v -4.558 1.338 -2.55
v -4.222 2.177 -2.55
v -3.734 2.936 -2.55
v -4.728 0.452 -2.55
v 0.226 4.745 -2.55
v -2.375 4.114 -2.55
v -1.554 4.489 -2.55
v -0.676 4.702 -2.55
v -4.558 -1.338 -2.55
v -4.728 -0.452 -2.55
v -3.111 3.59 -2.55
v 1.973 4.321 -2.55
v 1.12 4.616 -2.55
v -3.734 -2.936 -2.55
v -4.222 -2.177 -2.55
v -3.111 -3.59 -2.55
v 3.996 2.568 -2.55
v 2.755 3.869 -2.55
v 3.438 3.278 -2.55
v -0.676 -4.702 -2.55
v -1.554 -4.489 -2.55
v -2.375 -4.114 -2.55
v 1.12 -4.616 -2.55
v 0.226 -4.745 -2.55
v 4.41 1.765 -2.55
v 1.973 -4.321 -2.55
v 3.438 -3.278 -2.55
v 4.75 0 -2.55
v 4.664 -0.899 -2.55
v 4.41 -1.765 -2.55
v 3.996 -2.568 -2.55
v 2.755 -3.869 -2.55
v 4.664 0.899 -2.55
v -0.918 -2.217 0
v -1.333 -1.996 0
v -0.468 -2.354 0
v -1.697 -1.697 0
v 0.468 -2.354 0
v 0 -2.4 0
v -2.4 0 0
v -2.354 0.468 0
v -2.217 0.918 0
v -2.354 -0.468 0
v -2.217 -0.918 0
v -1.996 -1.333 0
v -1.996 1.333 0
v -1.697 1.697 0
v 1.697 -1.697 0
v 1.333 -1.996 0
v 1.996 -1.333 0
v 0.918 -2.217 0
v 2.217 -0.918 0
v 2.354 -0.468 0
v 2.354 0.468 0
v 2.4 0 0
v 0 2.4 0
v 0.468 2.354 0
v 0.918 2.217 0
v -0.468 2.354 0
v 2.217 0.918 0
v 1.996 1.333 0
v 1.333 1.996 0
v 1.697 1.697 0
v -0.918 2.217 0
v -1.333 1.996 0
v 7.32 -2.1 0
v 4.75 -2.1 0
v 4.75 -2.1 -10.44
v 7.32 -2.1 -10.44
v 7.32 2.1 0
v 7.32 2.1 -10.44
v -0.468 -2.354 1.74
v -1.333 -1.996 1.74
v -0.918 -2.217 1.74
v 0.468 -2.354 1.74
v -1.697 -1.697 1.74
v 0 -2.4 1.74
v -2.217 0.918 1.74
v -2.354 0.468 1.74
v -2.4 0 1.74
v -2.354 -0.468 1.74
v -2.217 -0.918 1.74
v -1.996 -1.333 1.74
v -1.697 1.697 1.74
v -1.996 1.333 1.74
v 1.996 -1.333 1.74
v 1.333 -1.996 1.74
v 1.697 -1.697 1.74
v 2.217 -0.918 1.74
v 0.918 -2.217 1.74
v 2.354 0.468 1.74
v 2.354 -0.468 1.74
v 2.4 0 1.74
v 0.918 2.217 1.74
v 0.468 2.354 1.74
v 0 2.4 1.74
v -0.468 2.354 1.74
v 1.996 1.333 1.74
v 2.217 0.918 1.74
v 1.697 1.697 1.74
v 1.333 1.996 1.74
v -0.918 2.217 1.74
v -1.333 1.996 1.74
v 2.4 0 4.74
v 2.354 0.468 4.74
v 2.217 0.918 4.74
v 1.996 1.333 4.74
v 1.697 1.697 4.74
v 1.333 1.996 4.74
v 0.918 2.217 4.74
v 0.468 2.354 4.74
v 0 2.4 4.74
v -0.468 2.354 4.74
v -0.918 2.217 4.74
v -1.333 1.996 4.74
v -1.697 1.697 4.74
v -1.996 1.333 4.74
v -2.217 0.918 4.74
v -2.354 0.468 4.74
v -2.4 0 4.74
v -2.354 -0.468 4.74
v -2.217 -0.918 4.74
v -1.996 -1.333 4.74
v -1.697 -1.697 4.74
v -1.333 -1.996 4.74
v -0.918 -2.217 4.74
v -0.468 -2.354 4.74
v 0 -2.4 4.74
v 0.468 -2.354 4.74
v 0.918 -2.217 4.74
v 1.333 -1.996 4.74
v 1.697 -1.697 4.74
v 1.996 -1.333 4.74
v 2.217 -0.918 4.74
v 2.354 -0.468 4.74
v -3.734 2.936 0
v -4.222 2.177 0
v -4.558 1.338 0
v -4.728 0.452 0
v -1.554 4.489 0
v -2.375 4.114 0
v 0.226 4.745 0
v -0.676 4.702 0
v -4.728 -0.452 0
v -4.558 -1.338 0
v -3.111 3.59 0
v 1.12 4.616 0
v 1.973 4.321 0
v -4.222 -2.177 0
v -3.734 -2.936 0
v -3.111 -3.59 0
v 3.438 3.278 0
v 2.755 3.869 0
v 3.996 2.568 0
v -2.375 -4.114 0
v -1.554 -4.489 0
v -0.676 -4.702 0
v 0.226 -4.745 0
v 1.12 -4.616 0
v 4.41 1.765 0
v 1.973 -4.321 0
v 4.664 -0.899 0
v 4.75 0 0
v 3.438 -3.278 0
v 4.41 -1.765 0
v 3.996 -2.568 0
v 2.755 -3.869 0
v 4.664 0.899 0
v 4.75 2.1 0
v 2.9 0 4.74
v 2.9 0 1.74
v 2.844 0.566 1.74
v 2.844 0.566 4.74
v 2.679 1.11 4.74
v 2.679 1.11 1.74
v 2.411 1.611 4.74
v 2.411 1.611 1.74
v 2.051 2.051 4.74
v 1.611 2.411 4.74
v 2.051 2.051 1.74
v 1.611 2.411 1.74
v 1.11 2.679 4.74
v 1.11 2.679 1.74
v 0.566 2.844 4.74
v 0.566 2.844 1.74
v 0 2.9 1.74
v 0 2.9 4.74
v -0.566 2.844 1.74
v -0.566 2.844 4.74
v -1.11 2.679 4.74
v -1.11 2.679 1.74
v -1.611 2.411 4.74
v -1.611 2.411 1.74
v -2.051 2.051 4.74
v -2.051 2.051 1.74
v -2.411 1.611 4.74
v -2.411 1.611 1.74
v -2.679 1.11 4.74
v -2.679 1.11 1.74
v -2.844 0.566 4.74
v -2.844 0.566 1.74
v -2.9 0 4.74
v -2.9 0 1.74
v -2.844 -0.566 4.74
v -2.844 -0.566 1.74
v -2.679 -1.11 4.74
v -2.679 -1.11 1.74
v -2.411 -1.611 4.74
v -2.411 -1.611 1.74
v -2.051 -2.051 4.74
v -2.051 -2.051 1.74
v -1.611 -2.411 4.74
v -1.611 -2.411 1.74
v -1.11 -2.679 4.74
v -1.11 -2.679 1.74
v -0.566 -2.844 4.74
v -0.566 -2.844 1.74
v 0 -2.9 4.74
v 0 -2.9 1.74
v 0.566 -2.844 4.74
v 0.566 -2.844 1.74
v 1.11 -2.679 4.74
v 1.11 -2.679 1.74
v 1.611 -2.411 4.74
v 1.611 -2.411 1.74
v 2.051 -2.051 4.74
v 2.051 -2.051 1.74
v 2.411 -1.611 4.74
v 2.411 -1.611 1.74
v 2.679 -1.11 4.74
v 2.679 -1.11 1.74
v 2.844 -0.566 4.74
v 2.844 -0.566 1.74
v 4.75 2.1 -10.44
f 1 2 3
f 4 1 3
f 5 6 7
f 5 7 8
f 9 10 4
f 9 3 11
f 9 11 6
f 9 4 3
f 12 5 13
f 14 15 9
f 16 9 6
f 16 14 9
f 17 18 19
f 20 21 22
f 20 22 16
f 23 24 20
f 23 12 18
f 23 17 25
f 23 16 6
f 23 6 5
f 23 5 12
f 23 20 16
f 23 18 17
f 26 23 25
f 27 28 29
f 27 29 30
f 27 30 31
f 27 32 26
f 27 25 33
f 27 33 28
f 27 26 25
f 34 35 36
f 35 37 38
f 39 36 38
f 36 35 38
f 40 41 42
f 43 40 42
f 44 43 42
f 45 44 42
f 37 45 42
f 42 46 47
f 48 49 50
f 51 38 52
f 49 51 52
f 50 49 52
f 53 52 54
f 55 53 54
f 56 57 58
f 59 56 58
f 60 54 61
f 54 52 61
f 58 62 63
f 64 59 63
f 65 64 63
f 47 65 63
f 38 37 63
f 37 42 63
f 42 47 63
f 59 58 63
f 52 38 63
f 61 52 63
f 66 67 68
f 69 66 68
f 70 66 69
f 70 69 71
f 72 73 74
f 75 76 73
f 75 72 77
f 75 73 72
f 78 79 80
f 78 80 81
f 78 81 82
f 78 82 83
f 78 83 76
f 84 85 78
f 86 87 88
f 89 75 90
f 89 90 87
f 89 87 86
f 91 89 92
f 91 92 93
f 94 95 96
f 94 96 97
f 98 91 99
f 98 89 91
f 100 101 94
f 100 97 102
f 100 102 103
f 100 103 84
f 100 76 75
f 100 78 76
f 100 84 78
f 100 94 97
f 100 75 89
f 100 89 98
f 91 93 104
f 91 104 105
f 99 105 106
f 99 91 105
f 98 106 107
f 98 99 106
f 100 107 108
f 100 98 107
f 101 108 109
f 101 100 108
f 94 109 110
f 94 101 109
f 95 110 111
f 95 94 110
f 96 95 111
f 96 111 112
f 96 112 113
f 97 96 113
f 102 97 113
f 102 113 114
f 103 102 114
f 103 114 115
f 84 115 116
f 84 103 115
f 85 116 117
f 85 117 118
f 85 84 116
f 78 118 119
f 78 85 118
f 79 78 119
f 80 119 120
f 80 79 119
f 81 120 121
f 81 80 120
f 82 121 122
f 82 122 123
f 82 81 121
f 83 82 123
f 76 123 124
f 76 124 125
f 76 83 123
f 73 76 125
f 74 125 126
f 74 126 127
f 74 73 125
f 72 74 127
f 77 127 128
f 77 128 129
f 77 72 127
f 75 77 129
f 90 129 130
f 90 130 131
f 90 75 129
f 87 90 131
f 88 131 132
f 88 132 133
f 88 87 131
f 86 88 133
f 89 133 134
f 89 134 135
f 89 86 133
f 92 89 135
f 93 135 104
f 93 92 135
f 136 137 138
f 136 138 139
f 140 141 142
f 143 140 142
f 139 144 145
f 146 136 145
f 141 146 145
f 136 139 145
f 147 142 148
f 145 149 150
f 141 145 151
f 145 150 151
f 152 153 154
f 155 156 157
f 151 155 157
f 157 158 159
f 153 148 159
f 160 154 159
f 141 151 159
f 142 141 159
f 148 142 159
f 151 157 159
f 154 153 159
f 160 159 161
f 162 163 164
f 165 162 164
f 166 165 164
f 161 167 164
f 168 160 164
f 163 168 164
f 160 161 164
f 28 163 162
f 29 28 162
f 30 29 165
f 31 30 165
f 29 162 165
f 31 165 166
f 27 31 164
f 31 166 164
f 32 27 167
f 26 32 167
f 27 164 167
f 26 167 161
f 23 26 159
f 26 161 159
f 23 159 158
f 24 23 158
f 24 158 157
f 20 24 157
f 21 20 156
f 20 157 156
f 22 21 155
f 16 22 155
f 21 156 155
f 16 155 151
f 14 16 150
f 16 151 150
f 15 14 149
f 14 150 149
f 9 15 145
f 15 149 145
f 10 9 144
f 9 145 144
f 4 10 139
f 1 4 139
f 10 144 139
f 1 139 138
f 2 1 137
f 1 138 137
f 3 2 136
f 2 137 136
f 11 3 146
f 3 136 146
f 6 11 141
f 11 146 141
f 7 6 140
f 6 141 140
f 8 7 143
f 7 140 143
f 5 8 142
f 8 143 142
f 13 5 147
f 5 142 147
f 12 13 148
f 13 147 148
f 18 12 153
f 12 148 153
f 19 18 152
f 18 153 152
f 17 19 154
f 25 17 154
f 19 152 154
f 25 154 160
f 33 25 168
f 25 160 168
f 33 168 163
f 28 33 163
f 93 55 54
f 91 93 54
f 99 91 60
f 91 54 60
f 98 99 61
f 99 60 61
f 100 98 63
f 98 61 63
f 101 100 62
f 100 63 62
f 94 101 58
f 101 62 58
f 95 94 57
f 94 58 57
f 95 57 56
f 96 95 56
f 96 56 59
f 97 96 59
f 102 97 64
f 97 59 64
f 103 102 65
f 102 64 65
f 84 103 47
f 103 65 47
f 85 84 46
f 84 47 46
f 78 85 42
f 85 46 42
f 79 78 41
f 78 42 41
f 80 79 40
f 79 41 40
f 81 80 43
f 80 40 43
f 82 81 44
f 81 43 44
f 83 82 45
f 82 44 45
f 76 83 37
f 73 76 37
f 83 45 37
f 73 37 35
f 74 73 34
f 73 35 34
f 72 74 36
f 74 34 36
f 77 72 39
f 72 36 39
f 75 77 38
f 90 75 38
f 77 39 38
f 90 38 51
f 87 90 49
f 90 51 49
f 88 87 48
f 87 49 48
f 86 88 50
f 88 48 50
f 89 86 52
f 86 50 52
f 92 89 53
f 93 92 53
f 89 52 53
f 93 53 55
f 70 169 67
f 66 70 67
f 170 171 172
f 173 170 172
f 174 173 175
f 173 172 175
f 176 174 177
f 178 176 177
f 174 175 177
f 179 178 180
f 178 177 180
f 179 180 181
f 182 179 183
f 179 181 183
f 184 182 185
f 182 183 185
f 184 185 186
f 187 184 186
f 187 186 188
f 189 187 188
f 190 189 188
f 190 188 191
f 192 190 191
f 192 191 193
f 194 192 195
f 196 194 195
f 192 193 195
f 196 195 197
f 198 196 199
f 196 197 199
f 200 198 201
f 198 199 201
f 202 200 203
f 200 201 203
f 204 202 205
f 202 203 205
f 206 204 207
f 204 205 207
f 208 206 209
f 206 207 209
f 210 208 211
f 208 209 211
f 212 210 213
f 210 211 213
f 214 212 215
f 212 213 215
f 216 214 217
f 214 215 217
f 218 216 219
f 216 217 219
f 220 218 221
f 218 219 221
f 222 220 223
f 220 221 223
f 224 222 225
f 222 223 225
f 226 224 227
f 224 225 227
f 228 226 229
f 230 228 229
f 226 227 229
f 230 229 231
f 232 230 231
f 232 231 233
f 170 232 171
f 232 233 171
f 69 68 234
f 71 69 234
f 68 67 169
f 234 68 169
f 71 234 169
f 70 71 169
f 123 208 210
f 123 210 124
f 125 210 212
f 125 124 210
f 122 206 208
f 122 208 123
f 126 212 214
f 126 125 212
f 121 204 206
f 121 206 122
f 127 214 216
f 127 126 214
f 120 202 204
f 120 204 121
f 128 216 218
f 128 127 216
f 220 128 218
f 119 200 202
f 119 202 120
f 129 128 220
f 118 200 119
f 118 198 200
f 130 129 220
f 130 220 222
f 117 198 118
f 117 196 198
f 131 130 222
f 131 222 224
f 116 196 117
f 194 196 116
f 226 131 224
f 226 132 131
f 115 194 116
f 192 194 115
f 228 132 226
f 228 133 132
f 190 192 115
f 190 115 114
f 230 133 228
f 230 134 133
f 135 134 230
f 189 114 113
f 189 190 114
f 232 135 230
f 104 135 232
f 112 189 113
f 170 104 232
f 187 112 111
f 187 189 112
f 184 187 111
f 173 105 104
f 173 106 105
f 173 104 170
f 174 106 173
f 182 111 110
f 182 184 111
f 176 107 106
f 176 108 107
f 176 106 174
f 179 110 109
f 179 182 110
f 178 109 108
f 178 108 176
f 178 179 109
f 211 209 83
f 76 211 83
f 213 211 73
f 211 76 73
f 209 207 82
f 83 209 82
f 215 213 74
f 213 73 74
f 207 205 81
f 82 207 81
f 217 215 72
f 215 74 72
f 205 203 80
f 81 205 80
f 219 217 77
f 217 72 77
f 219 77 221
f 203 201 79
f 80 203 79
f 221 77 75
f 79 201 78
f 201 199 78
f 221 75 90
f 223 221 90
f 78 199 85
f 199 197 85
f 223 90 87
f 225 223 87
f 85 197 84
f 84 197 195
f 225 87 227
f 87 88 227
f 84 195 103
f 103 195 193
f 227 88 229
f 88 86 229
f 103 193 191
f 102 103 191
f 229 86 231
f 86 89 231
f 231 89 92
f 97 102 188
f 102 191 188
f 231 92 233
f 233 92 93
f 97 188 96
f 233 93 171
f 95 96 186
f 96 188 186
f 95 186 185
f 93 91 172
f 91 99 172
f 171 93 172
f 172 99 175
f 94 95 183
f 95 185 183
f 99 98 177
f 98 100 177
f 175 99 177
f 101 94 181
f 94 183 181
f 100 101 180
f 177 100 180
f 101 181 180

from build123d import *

# Parameters (mm, degrees)
F0_R     = 2.4
F1_DEPTH = 1.74
F2_R     = 2.9
F2_R_2   = 2.4
F3_DEPTH = 3
F4_R     = 4.75
F4_R_2   = 2.4
F5_DEPTH = 2.55
F8_DEPTH = 2.57


with BuildPart() as f1:
    # F0 (on Top) → F1 (new body)
    with BuildSketch(Plane.XY):
        Circle(F0_R)
    extrude(amount=F1_DEPTH)


with BuildPart() as f3:
    # F2 (on face) → F3 (new body)
    with BuildSketch(Plane.XY.offset(1.74)):
        Circle(F2_R)
        Circle(F2_R_2, mode=Mode.SUBTRACT)
    extrude(amount=F3_DEPTH)


with BuildPart() as f5:
    # F4 (on face) → F5 (new body)
    with BuildSketch(Plane(origin=(0, 0, 0), x_dir=(1, 0, 0), z_dir=(0, 0, -1))):
        Circle(F4_R)
        Circle(F4_R_2, mode=Mode.SUBTRACT)
        Circle(F4_R_2)
    extrude(amount=F5_DEPTH)


with BuildPart() as f8:
    # F7 (on offset) → F8 (new body)
    with BuildSketch(Plane.YZ.offset(4.75)):
        Polygon((2.1, 0), (0, 0), (-2.1, 0), (-2.1, -10.44), (2.1, -10.44), align=None)
    extrude(amount=F8_DEPTH)


solid = Compound([f1.part, f3.part, f5.part, f8.part])
